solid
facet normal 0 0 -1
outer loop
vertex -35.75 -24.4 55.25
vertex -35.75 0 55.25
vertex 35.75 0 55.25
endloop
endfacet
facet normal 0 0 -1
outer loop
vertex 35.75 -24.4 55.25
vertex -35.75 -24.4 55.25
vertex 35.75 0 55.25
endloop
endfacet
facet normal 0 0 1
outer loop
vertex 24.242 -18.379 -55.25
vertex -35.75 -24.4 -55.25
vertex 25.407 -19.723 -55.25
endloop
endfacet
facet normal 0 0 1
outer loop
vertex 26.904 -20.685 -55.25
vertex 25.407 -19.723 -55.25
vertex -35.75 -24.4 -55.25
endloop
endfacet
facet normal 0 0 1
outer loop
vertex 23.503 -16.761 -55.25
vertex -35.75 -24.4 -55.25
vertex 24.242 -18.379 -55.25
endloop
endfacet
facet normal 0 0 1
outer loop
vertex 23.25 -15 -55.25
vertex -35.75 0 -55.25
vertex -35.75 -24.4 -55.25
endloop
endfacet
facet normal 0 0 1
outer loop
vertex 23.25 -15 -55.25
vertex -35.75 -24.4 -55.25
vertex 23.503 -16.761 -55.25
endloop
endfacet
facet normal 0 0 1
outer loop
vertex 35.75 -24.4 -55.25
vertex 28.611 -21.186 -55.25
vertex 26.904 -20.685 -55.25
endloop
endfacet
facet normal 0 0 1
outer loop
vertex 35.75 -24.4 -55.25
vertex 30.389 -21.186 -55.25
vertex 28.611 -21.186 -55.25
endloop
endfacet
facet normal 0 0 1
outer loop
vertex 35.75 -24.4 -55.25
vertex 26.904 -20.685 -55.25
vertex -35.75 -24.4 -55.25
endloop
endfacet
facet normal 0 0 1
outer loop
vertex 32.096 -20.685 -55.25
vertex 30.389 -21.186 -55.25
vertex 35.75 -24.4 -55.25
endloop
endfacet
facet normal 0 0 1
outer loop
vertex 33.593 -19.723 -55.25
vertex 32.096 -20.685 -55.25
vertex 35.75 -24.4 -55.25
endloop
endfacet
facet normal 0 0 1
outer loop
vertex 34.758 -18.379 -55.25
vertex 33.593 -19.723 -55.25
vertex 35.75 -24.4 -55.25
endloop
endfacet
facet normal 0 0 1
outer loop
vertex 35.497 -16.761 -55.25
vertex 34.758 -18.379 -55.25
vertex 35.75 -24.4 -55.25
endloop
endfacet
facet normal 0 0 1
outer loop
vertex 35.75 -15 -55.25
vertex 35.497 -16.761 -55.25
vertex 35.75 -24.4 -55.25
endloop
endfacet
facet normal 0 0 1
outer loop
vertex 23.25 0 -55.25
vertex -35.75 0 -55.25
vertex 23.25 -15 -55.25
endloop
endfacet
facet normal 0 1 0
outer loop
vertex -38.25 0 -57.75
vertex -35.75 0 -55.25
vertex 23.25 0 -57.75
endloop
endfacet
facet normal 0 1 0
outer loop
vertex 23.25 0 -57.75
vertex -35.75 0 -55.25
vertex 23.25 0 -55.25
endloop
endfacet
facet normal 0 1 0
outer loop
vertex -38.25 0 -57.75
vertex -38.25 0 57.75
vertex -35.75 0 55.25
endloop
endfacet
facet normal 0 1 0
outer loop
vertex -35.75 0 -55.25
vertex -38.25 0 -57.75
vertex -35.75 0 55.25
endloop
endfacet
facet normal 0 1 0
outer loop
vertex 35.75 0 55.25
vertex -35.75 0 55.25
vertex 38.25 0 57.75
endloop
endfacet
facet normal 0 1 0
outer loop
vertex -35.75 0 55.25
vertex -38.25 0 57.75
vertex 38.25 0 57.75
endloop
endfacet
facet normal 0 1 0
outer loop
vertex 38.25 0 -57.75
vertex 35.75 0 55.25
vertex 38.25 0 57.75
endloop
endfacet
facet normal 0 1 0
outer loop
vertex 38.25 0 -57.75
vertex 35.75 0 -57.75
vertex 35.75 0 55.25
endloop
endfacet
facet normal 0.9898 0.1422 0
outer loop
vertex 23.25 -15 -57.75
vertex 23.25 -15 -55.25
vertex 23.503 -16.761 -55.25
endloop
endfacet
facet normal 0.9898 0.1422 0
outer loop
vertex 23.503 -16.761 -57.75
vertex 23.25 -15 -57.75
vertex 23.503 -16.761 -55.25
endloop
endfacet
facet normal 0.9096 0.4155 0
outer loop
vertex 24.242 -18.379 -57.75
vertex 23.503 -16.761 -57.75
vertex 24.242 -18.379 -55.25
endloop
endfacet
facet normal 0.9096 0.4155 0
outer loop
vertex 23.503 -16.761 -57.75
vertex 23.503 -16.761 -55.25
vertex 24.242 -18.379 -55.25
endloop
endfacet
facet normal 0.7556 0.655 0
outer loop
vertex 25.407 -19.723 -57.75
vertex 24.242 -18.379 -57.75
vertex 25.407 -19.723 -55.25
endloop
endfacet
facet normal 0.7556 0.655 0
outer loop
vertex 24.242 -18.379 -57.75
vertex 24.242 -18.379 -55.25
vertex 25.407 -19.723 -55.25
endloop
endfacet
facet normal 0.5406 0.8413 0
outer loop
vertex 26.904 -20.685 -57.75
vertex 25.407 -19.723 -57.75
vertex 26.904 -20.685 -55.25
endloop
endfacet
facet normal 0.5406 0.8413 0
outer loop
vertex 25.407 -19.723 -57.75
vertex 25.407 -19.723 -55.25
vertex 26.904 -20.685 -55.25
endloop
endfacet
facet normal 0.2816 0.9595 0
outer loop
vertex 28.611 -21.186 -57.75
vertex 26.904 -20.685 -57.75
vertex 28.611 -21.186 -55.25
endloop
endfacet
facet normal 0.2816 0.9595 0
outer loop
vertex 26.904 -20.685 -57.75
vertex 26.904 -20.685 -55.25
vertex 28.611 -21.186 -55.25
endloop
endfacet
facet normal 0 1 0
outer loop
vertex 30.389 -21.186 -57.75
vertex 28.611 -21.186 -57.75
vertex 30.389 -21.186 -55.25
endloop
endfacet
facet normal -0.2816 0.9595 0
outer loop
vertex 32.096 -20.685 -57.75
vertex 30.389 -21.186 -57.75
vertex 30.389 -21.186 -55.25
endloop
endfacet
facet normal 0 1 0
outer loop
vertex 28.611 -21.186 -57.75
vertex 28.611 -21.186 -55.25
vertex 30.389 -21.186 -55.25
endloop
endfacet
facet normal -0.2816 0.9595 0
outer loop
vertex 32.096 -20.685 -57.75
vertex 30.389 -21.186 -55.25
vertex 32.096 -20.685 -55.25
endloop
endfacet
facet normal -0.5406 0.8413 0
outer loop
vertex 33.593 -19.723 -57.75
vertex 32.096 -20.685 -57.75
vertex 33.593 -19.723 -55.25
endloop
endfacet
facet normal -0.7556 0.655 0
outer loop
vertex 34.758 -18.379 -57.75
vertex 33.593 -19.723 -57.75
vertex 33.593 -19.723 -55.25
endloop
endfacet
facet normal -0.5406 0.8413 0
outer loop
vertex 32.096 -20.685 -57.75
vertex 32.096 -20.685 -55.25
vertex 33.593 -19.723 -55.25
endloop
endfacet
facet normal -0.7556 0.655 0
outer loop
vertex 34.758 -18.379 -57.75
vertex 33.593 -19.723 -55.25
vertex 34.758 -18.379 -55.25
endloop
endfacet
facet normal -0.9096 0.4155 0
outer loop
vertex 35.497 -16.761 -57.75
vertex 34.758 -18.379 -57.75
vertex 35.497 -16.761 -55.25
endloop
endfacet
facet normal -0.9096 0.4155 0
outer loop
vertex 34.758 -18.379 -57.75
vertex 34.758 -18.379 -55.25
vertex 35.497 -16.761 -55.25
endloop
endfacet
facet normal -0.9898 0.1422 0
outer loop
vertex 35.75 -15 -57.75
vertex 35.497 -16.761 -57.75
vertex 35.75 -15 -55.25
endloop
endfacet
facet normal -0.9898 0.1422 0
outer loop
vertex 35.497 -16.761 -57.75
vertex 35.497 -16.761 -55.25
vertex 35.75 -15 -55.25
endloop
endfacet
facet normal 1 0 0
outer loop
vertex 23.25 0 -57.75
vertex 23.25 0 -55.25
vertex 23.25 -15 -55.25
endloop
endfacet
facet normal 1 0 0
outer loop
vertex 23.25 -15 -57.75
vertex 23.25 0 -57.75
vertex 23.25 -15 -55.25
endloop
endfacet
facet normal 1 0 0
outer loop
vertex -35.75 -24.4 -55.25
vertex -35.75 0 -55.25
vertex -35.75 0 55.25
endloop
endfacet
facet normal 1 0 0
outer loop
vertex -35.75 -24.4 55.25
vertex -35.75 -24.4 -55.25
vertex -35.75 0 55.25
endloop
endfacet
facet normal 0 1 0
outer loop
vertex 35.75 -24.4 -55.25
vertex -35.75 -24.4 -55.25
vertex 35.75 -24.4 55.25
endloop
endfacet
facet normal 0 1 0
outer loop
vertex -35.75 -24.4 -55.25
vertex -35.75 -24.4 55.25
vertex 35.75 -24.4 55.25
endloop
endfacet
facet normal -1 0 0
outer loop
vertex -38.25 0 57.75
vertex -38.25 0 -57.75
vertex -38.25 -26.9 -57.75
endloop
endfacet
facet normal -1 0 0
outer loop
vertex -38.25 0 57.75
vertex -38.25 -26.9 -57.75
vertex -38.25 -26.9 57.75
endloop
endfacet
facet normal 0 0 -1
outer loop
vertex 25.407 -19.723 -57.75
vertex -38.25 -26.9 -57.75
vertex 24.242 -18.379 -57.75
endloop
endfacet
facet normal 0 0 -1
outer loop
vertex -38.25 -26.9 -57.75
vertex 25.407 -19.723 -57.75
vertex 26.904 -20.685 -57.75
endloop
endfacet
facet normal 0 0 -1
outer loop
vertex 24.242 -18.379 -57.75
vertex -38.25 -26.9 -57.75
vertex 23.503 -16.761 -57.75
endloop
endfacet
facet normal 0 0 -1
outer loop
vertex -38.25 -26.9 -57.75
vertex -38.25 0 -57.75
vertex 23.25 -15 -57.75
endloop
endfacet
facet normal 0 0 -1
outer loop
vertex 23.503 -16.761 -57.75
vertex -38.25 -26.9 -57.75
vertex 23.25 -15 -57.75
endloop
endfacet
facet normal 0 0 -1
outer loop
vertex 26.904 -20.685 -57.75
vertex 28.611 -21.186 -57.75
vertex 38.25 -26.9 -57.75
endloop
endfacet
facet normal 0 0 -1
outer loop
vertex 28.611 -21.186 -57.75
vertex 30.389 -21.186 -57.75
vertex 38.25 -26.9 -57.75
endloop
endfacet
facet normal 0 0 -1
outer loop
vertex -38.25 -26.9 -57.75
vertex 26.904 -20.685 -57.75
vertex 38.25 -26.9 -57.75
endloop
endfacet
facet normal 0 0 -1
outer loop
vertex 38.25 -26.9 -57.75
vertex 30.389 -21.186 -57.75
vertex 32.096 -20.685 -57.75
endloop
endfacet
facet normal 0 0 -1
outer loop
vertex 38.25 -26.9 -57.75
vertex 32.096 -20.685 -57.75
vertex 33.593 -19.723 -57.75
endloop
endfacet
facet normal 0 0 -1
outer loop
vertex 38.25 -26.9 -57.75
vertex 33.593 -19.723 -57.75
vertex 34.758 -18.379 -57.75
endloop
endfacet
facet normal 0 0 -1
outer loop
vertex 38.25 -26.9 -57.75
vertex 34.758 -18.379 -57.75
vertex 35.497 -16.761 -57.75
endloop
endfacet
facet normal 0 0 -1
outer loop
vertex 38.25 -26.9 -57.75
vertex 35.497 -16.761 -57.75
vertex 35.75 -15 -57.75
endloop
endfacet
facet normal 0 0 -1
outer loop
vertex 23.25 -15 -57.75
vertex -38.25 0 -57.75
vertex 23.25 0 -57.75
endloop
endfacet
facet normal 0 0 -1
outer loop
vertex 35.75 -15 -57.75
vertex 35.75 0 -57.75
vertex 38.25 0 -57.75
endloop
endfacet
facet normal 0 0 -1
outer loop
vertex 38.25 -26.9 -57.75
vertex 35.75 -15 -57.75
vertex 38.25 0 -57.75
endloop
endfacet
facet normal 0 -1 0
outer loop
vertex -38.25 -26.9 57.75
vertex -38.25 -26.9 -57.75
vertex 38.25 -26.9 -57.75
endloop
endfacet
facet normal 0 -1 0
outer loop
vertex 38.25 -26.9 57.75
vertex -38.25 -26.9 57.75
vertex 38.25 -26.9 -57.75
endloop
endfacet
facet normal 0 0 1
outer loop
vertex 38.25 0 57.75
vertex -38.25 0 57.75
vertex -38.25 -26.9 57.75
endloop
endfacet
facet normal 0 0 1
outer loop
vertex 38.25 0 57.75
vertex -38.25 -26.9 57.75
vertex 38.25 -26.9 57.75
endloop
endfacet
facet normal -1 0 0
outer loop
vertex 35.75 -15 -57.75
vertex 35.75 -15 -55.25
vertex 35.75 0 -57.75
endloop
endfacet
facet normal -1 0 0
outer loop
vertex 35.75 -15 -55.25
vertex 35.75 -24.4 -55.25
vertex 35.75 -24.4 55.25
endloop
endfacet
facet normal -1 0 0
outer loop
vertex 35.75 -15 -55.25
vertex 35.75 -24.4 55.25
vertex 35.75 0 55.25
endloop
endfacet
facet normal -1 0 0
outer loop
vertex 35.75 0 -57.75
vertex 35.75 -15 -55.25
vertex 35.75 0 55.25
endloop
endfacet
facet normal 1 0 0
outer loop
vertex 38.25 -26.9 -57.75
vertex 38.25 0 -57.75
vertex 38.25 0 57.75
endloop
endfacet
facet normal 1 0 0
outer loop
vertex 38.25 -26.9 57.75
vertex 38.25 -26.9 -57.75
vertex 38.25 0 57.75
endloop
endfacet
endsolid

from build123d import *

# Parameters (mm, degrees)
F0_W     = 76.5
F0_H     = 115.5
F1_DEPTH = 26.9
F2_T     = -2.5
F4_DEPTH = 25


with BuildPart() as f1:
    # F0 (on Front) → F1 (new body)
    with BuildSketch(Plane.XZ):
        Rectangle(F0_W, F0_H)
    extrude(amount=F1_DEPTH)

    # F2
    f2_openings = [f1.faces().sort_by_distance(p)[0] for p in [
        (0, 0, 0),
    ]]
    offset(amount=F2_T, openings=f2_openings)

    # F3 (on face) → F4 (cut)
    with BuildSketch(Plane.XY.offset(-55.25)):
        with BuildLine():
            Line((35.75, -15), (35.75, 0))
            Line((35.75, 0), (23.25, 0))
            Line((23.25, 0), (23.25, -15))
            ThreePointArc((23.25, -15), (29.5, -21.25), (35.75, -15))
        make_face()
    extrude(amount=-F4_DEPTH, mode=Mode.SUBTRACT)


solid = f1.part
